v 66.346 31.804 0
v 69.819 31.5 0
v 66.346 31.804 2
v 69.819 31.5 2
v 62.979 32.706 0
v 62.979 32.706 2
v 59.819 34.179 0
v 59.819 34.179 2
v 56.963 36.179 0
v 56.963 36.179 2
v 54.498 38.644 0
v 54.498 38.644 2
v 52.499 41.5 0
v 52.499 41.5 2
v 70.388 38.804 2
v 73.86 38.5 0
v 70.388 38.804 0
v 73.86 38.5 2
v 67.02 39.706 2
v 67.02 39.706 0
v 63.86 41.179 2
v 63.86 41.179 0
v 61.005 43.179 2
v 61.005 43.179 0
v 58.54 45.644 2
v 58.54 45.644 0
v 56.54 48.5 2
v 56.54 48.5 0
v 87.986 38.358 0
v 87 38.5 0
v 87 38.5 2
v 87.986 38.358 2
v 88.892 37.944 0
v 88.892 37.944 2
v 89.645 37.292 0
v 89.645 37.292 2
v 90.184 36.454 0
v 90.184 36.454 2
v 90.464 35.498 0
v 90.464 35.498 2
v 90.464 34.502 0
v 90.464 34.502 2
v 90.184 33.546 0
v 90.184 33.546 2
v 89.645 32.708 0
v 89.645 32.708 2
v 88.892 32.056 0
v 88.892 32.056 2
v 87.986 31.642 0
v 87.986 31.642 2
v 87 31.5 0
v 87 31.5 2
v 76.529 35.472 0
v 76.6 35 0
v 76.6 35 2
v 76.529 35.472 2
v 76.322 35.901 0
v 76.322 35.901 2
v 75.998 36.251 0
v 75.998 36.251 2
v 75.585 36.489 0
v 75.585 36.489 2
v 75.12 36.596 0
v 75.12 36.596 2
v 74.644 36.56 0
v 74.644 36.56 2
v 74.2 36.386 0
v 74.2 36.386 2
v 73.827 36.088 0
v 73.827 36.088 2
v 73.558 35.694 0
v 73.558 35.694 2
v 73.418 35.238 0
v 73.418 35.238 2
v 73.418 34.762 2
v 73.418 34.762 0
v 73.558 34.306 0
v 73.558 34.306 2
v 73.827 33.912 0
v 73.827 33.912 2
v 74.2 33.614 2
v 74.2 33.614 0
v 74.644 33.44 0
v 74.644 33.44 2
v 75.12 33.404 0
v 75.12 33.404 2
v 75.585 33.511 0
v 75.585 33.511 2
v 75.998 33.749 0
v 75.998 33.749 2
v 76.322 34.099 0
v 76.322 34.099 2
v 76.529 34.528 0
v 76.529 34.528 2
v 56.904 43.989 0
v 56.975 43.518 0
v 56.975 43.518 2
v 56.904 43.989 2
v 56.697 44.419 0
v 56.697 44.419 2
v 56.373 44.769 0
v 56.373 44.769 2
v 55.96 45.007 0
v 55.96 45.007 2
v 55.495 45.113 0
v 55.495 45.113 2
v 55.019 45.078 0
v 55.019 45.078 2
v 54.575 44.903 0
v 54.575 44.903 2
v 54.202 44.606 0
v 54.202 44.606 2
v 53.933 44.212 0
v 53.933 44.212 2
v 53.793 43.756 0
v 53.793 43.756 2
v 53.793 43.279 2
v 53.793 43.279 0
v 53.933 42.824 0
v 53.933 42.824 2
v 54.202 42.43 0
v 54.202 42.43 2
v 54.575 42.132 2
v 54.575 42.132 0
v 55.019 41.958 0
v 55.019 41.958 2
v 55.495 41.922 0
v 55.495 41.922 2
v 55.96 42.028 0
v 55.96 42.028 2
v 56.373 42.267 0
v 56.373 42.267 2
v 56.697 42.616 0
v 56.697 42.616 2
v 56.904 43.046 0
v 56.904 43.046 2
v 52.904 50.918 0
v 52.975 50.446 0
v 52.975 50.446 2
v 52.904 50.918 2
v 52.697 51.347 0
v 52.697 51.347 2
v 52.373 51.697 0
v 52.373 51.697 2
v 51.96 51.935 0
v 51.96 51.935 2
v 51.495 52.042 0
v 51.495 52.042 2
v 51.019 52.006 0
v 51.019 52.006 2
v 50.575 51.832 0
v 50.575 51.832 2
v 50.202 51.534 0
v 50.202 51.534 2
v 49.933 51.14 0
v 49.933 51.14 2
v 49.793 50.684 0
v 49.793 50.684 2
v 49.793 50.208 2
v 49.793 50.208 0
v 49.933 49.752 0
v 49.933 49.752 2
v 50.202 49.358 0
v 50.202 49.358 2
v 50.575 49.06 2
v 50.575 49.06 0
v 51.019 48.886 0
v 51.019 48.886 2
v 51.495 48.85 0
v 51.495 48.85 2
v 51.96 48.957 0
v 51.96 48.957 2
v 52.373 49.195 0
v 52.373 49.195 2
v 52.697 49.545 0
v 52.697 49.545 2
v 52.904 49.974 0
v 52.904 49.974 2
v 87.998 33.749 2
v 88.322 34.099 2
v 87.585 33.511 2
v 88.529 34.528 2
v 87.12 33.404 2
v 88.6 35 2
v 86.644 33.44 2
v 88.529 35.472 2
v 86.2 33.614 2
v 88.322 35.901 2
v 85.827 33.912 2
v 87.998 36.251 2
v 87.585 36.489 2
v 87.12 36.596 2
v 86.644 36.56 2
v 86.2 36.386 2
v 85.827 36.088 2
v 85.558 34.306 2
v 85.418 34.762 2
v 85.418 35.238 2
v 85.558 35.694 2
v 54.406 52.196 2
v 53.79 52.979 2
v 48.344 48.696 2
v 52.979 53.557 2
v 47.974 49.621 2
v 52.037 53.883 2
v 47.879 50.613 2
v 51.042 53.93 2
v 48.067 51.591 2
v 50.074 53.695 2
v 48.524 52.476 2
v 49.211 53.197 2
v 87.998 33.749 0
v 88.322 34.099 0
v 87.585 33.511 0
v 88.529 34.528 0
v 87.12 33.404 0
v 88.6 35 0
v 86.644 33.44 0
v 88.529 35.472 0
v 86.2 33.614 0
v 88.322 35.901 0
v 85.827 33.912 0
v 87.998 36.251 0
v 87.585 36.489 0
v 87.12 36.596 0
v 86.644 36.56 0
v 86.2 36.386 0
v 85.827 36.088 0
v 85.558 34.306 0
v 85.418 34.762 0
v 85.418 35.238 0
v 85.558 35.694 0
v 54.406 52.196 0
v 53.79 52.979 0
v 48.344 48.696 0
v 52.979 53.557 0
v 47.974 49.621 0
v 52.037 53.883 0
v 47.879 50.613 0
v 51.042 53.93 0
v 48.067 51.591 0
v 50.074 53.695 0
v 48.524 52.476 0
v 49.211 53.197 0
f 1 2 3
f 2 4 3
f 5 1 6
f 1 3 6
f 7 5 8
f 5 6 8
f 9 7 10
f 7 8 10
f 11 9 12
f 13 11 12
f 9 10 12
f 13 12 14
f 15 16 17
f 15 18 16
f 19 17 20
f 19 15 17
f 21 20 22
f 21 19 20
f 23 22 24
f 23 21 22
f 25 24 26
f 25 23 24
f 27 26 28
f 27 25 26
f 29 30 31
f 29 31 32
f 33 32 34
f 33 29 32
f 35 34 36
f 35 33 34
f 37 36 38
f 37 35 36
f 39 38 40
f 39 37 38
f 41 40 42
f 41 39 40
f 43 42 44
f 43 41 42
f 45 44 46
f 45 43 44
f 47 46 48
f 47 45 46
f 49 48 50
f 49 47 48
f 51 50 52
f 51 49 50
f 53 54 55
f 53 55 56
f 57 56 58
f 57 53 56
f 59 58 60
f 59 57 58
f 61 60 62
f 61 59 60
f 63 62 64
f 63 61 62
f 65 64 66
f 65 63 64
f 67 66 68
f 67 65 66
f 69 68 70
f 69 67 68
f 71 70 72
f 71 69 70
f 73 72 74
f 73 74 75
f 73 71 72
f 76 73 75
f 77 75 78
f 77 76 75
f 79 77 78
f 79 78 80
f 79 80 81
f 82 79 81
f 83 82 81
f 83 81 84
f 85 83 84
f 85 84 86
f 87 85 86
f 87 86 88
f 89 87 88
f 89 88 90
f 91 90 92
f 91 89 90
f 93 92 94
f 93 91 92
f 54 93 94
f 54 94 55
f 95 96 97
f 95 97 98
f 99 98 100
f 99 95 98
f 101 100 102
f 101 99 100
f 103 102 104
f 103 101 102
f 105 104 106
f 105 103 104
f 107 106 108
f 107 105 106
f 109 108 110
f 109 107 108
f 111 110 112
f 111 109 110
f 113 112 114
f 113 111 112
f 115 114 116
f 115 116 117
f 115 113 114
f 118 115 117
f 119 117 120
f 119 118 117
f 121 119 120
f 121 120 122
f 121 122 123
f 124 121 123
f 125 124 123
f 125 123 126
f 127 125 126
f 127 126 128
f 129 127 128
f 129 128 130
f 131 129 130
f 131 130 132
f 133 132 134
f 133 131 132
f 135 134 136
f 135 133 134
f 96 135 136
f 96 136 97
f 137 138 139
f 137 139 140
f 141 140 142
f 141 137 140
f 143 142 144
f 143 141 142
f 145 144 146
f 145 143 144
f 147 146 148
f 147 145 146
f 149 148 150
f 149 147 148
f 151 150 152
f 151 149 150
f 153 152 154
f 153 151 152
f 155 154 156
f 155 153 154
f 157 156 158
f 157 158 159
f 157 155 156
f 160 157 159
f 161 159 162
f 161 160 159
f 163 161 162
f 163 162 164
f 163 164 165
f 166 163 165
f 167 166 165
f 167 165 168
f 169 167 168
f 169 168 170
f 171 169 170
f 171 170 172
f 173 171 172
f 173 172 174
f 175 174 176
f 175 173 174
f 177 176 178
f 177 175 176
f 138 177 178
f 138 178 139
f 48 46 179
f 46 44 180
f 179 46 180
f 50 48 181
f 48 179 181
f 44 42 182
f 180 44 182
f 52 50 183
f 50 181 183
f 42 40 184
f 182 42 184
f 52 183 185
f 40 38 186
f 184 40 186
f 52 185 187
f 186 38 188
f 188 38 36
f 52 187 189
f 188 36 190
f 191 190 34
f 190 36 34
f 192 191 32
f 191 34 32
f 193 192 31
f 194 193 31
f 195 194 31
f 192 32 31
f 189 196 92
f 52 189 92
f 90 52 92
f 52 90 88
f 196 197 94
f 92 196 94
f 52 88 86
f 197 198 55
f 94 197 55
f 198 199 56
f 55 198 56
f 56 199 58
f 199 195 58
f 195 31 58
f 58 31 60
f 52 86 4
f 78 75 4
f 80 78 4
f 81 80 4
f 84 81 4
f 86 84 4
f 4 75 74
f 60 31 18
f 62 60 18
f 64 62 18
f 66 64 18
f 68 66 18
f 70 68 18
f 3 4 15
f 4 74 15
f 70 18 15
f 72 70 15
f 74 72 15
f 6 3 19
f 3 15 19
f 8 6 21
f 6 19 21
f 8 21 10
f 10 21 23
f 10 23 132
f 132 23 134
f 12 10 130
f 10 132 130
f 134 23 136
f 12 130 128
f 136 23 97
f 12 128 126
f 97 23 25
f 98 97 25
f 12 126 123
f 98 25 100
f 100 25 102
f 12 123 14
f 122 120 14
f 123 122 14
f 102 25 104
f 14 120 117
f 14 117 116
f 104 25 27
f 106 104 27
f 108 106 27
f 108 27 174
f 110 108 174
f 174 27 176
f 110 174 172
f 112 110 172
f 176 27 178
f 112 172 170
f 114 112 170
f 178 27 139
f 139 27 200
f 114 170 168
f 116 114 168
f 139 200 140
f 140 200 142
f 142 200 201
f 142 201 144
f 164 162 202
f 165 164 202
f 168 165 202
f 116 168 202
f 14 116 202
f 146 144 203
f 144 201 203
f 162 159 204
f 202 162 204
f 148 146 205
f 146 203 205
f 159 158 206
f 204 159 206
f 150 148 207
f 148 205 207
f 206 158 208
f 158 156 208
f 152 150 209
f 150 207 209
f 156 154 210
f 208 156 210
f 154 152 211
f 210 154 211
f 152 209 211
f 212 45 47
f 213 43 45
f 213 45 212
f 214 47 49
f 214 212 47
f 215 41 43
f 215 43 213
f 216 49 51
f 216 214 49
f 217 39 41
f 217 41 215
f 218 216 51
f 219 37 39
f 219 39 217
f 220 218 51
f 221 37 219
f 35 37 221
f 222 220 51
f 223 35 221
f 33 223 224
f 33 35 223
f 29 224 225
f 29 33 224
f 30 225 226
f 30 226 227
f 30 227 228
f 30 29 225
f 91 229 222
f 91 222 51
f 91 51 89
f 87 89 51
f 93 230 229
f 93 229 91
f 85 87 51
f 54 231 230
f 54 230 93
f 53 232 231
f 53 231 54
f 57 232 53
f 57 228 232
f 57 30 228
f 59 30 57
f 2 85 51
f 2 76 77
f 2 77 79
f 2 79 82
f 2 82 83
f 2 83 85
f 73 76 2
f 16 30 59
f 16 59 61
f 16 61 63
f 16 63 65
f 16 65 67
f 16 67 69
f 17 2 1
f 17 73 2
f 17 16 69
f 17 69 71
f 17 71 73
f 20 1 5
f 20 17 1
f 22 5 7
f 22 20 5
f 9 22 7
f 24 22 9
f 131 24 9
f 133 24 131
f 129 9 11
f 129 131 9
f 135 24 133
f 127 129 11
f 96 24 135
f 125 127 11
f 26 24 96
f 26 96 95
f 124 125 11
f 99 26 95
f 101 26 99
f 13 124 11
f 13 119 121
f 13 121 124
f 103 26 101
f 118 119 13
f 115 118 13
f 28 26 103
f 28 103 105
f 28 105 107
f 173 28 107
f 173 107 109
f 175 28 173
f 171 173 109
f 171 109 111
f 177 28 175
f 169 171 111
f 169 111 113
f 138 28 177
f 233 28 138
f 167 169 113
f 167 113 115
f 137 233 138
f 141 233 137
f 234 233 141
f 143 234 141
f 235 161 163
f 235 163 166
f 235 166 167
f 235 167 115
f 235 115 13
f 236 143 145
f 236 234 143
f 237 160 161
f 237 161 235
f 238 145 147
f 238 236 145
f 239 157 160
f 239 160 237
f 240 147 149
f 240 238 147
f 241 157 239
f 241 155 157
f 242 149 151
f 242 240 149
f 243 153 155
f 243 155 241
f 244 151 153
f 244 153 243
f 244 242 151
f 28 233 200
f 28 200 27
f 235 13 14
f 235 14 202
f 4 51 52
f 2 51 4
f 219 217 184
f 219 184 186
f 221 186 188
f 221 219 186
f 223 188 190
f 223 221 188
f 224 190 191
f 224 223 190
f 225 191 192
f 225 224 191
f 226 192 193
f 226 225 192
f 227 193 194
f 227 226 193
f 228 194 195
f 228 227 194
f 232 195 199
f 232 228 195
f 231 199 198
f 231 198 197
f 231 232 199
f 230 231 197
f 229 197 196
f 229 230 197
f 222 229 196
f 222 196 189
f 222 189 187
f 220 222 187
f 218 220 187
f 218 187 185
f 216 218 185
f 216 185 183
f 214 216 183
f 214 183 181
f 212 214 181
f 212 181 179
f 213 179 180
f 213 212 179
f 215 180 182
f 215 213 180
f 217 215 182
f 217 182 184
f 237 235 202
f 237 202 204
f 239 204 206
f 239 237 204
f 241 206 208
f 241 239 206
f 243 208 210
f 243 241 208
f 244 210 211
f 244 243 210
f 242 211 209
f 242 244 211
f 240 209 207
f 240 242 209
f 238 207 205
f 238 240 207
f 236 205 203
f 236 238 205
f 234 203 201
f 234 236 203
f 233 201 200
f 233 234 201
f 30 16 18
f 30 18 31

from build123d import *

# Parameters (mm, degrees)
SKETCH_1_R      = 1.6
EXTRUDE_1_DEPTH = 2
FILLET_1_R      = 20


with BuildPart() as part:
    # ｽｹｯﾁ1 → ﾎﾞｽ - 押し出し1 (new body)
    with BuildSketch(Plane.XY):
        with BuildLine():
            ThreePointArc((87, 38.5), (90.5, 35), (87, 31.5))
            Line((87, 31.5), (58.272014636, 31.5))
            Line((58.272014636, 31.5), (48.343911087, 48.69597977))
            ThreePointArc((48.343911087, 48.69597977), (49.625, 53.477068684), (54.406088913, 52.19597977))
            Line((54.406088913, 52.19597977), (62.313466521, 38.5))
            Line((62.313466521, 38.5), (87, 38.5))
        make_face()
        with Locations((87, 35)):
            Circle(SKETCH_1_R, mode=Mode.SUBTRACT)
        with Locations((75, 35)):
            Circle(SKETCH_1_R, mode=Mode.SUBTRACT)
        with Locations((55.375, 43.51777654)):
            Circle(SKETCH_1_R, mode=Mode.SUBTRACT)
        with Locations((51.375, 50.44597977)):
            Circle(SKETCH_1_R, mode=Mode.SUBTRACT)
    extrude(amount=EXTRUDE_1_DEPTH)

    # ﾌｨﾚｯﾄ1
    fillet_1_edges = [part.edges().sort_by_distance(p)[0] for p in [
        (58.272014636, 31.5, 1),
        (62.313466521, 38.5, 1),
    ]]
    fillet(fillet_1_edges, radius=FILLET_1_R)


solid = part.part
